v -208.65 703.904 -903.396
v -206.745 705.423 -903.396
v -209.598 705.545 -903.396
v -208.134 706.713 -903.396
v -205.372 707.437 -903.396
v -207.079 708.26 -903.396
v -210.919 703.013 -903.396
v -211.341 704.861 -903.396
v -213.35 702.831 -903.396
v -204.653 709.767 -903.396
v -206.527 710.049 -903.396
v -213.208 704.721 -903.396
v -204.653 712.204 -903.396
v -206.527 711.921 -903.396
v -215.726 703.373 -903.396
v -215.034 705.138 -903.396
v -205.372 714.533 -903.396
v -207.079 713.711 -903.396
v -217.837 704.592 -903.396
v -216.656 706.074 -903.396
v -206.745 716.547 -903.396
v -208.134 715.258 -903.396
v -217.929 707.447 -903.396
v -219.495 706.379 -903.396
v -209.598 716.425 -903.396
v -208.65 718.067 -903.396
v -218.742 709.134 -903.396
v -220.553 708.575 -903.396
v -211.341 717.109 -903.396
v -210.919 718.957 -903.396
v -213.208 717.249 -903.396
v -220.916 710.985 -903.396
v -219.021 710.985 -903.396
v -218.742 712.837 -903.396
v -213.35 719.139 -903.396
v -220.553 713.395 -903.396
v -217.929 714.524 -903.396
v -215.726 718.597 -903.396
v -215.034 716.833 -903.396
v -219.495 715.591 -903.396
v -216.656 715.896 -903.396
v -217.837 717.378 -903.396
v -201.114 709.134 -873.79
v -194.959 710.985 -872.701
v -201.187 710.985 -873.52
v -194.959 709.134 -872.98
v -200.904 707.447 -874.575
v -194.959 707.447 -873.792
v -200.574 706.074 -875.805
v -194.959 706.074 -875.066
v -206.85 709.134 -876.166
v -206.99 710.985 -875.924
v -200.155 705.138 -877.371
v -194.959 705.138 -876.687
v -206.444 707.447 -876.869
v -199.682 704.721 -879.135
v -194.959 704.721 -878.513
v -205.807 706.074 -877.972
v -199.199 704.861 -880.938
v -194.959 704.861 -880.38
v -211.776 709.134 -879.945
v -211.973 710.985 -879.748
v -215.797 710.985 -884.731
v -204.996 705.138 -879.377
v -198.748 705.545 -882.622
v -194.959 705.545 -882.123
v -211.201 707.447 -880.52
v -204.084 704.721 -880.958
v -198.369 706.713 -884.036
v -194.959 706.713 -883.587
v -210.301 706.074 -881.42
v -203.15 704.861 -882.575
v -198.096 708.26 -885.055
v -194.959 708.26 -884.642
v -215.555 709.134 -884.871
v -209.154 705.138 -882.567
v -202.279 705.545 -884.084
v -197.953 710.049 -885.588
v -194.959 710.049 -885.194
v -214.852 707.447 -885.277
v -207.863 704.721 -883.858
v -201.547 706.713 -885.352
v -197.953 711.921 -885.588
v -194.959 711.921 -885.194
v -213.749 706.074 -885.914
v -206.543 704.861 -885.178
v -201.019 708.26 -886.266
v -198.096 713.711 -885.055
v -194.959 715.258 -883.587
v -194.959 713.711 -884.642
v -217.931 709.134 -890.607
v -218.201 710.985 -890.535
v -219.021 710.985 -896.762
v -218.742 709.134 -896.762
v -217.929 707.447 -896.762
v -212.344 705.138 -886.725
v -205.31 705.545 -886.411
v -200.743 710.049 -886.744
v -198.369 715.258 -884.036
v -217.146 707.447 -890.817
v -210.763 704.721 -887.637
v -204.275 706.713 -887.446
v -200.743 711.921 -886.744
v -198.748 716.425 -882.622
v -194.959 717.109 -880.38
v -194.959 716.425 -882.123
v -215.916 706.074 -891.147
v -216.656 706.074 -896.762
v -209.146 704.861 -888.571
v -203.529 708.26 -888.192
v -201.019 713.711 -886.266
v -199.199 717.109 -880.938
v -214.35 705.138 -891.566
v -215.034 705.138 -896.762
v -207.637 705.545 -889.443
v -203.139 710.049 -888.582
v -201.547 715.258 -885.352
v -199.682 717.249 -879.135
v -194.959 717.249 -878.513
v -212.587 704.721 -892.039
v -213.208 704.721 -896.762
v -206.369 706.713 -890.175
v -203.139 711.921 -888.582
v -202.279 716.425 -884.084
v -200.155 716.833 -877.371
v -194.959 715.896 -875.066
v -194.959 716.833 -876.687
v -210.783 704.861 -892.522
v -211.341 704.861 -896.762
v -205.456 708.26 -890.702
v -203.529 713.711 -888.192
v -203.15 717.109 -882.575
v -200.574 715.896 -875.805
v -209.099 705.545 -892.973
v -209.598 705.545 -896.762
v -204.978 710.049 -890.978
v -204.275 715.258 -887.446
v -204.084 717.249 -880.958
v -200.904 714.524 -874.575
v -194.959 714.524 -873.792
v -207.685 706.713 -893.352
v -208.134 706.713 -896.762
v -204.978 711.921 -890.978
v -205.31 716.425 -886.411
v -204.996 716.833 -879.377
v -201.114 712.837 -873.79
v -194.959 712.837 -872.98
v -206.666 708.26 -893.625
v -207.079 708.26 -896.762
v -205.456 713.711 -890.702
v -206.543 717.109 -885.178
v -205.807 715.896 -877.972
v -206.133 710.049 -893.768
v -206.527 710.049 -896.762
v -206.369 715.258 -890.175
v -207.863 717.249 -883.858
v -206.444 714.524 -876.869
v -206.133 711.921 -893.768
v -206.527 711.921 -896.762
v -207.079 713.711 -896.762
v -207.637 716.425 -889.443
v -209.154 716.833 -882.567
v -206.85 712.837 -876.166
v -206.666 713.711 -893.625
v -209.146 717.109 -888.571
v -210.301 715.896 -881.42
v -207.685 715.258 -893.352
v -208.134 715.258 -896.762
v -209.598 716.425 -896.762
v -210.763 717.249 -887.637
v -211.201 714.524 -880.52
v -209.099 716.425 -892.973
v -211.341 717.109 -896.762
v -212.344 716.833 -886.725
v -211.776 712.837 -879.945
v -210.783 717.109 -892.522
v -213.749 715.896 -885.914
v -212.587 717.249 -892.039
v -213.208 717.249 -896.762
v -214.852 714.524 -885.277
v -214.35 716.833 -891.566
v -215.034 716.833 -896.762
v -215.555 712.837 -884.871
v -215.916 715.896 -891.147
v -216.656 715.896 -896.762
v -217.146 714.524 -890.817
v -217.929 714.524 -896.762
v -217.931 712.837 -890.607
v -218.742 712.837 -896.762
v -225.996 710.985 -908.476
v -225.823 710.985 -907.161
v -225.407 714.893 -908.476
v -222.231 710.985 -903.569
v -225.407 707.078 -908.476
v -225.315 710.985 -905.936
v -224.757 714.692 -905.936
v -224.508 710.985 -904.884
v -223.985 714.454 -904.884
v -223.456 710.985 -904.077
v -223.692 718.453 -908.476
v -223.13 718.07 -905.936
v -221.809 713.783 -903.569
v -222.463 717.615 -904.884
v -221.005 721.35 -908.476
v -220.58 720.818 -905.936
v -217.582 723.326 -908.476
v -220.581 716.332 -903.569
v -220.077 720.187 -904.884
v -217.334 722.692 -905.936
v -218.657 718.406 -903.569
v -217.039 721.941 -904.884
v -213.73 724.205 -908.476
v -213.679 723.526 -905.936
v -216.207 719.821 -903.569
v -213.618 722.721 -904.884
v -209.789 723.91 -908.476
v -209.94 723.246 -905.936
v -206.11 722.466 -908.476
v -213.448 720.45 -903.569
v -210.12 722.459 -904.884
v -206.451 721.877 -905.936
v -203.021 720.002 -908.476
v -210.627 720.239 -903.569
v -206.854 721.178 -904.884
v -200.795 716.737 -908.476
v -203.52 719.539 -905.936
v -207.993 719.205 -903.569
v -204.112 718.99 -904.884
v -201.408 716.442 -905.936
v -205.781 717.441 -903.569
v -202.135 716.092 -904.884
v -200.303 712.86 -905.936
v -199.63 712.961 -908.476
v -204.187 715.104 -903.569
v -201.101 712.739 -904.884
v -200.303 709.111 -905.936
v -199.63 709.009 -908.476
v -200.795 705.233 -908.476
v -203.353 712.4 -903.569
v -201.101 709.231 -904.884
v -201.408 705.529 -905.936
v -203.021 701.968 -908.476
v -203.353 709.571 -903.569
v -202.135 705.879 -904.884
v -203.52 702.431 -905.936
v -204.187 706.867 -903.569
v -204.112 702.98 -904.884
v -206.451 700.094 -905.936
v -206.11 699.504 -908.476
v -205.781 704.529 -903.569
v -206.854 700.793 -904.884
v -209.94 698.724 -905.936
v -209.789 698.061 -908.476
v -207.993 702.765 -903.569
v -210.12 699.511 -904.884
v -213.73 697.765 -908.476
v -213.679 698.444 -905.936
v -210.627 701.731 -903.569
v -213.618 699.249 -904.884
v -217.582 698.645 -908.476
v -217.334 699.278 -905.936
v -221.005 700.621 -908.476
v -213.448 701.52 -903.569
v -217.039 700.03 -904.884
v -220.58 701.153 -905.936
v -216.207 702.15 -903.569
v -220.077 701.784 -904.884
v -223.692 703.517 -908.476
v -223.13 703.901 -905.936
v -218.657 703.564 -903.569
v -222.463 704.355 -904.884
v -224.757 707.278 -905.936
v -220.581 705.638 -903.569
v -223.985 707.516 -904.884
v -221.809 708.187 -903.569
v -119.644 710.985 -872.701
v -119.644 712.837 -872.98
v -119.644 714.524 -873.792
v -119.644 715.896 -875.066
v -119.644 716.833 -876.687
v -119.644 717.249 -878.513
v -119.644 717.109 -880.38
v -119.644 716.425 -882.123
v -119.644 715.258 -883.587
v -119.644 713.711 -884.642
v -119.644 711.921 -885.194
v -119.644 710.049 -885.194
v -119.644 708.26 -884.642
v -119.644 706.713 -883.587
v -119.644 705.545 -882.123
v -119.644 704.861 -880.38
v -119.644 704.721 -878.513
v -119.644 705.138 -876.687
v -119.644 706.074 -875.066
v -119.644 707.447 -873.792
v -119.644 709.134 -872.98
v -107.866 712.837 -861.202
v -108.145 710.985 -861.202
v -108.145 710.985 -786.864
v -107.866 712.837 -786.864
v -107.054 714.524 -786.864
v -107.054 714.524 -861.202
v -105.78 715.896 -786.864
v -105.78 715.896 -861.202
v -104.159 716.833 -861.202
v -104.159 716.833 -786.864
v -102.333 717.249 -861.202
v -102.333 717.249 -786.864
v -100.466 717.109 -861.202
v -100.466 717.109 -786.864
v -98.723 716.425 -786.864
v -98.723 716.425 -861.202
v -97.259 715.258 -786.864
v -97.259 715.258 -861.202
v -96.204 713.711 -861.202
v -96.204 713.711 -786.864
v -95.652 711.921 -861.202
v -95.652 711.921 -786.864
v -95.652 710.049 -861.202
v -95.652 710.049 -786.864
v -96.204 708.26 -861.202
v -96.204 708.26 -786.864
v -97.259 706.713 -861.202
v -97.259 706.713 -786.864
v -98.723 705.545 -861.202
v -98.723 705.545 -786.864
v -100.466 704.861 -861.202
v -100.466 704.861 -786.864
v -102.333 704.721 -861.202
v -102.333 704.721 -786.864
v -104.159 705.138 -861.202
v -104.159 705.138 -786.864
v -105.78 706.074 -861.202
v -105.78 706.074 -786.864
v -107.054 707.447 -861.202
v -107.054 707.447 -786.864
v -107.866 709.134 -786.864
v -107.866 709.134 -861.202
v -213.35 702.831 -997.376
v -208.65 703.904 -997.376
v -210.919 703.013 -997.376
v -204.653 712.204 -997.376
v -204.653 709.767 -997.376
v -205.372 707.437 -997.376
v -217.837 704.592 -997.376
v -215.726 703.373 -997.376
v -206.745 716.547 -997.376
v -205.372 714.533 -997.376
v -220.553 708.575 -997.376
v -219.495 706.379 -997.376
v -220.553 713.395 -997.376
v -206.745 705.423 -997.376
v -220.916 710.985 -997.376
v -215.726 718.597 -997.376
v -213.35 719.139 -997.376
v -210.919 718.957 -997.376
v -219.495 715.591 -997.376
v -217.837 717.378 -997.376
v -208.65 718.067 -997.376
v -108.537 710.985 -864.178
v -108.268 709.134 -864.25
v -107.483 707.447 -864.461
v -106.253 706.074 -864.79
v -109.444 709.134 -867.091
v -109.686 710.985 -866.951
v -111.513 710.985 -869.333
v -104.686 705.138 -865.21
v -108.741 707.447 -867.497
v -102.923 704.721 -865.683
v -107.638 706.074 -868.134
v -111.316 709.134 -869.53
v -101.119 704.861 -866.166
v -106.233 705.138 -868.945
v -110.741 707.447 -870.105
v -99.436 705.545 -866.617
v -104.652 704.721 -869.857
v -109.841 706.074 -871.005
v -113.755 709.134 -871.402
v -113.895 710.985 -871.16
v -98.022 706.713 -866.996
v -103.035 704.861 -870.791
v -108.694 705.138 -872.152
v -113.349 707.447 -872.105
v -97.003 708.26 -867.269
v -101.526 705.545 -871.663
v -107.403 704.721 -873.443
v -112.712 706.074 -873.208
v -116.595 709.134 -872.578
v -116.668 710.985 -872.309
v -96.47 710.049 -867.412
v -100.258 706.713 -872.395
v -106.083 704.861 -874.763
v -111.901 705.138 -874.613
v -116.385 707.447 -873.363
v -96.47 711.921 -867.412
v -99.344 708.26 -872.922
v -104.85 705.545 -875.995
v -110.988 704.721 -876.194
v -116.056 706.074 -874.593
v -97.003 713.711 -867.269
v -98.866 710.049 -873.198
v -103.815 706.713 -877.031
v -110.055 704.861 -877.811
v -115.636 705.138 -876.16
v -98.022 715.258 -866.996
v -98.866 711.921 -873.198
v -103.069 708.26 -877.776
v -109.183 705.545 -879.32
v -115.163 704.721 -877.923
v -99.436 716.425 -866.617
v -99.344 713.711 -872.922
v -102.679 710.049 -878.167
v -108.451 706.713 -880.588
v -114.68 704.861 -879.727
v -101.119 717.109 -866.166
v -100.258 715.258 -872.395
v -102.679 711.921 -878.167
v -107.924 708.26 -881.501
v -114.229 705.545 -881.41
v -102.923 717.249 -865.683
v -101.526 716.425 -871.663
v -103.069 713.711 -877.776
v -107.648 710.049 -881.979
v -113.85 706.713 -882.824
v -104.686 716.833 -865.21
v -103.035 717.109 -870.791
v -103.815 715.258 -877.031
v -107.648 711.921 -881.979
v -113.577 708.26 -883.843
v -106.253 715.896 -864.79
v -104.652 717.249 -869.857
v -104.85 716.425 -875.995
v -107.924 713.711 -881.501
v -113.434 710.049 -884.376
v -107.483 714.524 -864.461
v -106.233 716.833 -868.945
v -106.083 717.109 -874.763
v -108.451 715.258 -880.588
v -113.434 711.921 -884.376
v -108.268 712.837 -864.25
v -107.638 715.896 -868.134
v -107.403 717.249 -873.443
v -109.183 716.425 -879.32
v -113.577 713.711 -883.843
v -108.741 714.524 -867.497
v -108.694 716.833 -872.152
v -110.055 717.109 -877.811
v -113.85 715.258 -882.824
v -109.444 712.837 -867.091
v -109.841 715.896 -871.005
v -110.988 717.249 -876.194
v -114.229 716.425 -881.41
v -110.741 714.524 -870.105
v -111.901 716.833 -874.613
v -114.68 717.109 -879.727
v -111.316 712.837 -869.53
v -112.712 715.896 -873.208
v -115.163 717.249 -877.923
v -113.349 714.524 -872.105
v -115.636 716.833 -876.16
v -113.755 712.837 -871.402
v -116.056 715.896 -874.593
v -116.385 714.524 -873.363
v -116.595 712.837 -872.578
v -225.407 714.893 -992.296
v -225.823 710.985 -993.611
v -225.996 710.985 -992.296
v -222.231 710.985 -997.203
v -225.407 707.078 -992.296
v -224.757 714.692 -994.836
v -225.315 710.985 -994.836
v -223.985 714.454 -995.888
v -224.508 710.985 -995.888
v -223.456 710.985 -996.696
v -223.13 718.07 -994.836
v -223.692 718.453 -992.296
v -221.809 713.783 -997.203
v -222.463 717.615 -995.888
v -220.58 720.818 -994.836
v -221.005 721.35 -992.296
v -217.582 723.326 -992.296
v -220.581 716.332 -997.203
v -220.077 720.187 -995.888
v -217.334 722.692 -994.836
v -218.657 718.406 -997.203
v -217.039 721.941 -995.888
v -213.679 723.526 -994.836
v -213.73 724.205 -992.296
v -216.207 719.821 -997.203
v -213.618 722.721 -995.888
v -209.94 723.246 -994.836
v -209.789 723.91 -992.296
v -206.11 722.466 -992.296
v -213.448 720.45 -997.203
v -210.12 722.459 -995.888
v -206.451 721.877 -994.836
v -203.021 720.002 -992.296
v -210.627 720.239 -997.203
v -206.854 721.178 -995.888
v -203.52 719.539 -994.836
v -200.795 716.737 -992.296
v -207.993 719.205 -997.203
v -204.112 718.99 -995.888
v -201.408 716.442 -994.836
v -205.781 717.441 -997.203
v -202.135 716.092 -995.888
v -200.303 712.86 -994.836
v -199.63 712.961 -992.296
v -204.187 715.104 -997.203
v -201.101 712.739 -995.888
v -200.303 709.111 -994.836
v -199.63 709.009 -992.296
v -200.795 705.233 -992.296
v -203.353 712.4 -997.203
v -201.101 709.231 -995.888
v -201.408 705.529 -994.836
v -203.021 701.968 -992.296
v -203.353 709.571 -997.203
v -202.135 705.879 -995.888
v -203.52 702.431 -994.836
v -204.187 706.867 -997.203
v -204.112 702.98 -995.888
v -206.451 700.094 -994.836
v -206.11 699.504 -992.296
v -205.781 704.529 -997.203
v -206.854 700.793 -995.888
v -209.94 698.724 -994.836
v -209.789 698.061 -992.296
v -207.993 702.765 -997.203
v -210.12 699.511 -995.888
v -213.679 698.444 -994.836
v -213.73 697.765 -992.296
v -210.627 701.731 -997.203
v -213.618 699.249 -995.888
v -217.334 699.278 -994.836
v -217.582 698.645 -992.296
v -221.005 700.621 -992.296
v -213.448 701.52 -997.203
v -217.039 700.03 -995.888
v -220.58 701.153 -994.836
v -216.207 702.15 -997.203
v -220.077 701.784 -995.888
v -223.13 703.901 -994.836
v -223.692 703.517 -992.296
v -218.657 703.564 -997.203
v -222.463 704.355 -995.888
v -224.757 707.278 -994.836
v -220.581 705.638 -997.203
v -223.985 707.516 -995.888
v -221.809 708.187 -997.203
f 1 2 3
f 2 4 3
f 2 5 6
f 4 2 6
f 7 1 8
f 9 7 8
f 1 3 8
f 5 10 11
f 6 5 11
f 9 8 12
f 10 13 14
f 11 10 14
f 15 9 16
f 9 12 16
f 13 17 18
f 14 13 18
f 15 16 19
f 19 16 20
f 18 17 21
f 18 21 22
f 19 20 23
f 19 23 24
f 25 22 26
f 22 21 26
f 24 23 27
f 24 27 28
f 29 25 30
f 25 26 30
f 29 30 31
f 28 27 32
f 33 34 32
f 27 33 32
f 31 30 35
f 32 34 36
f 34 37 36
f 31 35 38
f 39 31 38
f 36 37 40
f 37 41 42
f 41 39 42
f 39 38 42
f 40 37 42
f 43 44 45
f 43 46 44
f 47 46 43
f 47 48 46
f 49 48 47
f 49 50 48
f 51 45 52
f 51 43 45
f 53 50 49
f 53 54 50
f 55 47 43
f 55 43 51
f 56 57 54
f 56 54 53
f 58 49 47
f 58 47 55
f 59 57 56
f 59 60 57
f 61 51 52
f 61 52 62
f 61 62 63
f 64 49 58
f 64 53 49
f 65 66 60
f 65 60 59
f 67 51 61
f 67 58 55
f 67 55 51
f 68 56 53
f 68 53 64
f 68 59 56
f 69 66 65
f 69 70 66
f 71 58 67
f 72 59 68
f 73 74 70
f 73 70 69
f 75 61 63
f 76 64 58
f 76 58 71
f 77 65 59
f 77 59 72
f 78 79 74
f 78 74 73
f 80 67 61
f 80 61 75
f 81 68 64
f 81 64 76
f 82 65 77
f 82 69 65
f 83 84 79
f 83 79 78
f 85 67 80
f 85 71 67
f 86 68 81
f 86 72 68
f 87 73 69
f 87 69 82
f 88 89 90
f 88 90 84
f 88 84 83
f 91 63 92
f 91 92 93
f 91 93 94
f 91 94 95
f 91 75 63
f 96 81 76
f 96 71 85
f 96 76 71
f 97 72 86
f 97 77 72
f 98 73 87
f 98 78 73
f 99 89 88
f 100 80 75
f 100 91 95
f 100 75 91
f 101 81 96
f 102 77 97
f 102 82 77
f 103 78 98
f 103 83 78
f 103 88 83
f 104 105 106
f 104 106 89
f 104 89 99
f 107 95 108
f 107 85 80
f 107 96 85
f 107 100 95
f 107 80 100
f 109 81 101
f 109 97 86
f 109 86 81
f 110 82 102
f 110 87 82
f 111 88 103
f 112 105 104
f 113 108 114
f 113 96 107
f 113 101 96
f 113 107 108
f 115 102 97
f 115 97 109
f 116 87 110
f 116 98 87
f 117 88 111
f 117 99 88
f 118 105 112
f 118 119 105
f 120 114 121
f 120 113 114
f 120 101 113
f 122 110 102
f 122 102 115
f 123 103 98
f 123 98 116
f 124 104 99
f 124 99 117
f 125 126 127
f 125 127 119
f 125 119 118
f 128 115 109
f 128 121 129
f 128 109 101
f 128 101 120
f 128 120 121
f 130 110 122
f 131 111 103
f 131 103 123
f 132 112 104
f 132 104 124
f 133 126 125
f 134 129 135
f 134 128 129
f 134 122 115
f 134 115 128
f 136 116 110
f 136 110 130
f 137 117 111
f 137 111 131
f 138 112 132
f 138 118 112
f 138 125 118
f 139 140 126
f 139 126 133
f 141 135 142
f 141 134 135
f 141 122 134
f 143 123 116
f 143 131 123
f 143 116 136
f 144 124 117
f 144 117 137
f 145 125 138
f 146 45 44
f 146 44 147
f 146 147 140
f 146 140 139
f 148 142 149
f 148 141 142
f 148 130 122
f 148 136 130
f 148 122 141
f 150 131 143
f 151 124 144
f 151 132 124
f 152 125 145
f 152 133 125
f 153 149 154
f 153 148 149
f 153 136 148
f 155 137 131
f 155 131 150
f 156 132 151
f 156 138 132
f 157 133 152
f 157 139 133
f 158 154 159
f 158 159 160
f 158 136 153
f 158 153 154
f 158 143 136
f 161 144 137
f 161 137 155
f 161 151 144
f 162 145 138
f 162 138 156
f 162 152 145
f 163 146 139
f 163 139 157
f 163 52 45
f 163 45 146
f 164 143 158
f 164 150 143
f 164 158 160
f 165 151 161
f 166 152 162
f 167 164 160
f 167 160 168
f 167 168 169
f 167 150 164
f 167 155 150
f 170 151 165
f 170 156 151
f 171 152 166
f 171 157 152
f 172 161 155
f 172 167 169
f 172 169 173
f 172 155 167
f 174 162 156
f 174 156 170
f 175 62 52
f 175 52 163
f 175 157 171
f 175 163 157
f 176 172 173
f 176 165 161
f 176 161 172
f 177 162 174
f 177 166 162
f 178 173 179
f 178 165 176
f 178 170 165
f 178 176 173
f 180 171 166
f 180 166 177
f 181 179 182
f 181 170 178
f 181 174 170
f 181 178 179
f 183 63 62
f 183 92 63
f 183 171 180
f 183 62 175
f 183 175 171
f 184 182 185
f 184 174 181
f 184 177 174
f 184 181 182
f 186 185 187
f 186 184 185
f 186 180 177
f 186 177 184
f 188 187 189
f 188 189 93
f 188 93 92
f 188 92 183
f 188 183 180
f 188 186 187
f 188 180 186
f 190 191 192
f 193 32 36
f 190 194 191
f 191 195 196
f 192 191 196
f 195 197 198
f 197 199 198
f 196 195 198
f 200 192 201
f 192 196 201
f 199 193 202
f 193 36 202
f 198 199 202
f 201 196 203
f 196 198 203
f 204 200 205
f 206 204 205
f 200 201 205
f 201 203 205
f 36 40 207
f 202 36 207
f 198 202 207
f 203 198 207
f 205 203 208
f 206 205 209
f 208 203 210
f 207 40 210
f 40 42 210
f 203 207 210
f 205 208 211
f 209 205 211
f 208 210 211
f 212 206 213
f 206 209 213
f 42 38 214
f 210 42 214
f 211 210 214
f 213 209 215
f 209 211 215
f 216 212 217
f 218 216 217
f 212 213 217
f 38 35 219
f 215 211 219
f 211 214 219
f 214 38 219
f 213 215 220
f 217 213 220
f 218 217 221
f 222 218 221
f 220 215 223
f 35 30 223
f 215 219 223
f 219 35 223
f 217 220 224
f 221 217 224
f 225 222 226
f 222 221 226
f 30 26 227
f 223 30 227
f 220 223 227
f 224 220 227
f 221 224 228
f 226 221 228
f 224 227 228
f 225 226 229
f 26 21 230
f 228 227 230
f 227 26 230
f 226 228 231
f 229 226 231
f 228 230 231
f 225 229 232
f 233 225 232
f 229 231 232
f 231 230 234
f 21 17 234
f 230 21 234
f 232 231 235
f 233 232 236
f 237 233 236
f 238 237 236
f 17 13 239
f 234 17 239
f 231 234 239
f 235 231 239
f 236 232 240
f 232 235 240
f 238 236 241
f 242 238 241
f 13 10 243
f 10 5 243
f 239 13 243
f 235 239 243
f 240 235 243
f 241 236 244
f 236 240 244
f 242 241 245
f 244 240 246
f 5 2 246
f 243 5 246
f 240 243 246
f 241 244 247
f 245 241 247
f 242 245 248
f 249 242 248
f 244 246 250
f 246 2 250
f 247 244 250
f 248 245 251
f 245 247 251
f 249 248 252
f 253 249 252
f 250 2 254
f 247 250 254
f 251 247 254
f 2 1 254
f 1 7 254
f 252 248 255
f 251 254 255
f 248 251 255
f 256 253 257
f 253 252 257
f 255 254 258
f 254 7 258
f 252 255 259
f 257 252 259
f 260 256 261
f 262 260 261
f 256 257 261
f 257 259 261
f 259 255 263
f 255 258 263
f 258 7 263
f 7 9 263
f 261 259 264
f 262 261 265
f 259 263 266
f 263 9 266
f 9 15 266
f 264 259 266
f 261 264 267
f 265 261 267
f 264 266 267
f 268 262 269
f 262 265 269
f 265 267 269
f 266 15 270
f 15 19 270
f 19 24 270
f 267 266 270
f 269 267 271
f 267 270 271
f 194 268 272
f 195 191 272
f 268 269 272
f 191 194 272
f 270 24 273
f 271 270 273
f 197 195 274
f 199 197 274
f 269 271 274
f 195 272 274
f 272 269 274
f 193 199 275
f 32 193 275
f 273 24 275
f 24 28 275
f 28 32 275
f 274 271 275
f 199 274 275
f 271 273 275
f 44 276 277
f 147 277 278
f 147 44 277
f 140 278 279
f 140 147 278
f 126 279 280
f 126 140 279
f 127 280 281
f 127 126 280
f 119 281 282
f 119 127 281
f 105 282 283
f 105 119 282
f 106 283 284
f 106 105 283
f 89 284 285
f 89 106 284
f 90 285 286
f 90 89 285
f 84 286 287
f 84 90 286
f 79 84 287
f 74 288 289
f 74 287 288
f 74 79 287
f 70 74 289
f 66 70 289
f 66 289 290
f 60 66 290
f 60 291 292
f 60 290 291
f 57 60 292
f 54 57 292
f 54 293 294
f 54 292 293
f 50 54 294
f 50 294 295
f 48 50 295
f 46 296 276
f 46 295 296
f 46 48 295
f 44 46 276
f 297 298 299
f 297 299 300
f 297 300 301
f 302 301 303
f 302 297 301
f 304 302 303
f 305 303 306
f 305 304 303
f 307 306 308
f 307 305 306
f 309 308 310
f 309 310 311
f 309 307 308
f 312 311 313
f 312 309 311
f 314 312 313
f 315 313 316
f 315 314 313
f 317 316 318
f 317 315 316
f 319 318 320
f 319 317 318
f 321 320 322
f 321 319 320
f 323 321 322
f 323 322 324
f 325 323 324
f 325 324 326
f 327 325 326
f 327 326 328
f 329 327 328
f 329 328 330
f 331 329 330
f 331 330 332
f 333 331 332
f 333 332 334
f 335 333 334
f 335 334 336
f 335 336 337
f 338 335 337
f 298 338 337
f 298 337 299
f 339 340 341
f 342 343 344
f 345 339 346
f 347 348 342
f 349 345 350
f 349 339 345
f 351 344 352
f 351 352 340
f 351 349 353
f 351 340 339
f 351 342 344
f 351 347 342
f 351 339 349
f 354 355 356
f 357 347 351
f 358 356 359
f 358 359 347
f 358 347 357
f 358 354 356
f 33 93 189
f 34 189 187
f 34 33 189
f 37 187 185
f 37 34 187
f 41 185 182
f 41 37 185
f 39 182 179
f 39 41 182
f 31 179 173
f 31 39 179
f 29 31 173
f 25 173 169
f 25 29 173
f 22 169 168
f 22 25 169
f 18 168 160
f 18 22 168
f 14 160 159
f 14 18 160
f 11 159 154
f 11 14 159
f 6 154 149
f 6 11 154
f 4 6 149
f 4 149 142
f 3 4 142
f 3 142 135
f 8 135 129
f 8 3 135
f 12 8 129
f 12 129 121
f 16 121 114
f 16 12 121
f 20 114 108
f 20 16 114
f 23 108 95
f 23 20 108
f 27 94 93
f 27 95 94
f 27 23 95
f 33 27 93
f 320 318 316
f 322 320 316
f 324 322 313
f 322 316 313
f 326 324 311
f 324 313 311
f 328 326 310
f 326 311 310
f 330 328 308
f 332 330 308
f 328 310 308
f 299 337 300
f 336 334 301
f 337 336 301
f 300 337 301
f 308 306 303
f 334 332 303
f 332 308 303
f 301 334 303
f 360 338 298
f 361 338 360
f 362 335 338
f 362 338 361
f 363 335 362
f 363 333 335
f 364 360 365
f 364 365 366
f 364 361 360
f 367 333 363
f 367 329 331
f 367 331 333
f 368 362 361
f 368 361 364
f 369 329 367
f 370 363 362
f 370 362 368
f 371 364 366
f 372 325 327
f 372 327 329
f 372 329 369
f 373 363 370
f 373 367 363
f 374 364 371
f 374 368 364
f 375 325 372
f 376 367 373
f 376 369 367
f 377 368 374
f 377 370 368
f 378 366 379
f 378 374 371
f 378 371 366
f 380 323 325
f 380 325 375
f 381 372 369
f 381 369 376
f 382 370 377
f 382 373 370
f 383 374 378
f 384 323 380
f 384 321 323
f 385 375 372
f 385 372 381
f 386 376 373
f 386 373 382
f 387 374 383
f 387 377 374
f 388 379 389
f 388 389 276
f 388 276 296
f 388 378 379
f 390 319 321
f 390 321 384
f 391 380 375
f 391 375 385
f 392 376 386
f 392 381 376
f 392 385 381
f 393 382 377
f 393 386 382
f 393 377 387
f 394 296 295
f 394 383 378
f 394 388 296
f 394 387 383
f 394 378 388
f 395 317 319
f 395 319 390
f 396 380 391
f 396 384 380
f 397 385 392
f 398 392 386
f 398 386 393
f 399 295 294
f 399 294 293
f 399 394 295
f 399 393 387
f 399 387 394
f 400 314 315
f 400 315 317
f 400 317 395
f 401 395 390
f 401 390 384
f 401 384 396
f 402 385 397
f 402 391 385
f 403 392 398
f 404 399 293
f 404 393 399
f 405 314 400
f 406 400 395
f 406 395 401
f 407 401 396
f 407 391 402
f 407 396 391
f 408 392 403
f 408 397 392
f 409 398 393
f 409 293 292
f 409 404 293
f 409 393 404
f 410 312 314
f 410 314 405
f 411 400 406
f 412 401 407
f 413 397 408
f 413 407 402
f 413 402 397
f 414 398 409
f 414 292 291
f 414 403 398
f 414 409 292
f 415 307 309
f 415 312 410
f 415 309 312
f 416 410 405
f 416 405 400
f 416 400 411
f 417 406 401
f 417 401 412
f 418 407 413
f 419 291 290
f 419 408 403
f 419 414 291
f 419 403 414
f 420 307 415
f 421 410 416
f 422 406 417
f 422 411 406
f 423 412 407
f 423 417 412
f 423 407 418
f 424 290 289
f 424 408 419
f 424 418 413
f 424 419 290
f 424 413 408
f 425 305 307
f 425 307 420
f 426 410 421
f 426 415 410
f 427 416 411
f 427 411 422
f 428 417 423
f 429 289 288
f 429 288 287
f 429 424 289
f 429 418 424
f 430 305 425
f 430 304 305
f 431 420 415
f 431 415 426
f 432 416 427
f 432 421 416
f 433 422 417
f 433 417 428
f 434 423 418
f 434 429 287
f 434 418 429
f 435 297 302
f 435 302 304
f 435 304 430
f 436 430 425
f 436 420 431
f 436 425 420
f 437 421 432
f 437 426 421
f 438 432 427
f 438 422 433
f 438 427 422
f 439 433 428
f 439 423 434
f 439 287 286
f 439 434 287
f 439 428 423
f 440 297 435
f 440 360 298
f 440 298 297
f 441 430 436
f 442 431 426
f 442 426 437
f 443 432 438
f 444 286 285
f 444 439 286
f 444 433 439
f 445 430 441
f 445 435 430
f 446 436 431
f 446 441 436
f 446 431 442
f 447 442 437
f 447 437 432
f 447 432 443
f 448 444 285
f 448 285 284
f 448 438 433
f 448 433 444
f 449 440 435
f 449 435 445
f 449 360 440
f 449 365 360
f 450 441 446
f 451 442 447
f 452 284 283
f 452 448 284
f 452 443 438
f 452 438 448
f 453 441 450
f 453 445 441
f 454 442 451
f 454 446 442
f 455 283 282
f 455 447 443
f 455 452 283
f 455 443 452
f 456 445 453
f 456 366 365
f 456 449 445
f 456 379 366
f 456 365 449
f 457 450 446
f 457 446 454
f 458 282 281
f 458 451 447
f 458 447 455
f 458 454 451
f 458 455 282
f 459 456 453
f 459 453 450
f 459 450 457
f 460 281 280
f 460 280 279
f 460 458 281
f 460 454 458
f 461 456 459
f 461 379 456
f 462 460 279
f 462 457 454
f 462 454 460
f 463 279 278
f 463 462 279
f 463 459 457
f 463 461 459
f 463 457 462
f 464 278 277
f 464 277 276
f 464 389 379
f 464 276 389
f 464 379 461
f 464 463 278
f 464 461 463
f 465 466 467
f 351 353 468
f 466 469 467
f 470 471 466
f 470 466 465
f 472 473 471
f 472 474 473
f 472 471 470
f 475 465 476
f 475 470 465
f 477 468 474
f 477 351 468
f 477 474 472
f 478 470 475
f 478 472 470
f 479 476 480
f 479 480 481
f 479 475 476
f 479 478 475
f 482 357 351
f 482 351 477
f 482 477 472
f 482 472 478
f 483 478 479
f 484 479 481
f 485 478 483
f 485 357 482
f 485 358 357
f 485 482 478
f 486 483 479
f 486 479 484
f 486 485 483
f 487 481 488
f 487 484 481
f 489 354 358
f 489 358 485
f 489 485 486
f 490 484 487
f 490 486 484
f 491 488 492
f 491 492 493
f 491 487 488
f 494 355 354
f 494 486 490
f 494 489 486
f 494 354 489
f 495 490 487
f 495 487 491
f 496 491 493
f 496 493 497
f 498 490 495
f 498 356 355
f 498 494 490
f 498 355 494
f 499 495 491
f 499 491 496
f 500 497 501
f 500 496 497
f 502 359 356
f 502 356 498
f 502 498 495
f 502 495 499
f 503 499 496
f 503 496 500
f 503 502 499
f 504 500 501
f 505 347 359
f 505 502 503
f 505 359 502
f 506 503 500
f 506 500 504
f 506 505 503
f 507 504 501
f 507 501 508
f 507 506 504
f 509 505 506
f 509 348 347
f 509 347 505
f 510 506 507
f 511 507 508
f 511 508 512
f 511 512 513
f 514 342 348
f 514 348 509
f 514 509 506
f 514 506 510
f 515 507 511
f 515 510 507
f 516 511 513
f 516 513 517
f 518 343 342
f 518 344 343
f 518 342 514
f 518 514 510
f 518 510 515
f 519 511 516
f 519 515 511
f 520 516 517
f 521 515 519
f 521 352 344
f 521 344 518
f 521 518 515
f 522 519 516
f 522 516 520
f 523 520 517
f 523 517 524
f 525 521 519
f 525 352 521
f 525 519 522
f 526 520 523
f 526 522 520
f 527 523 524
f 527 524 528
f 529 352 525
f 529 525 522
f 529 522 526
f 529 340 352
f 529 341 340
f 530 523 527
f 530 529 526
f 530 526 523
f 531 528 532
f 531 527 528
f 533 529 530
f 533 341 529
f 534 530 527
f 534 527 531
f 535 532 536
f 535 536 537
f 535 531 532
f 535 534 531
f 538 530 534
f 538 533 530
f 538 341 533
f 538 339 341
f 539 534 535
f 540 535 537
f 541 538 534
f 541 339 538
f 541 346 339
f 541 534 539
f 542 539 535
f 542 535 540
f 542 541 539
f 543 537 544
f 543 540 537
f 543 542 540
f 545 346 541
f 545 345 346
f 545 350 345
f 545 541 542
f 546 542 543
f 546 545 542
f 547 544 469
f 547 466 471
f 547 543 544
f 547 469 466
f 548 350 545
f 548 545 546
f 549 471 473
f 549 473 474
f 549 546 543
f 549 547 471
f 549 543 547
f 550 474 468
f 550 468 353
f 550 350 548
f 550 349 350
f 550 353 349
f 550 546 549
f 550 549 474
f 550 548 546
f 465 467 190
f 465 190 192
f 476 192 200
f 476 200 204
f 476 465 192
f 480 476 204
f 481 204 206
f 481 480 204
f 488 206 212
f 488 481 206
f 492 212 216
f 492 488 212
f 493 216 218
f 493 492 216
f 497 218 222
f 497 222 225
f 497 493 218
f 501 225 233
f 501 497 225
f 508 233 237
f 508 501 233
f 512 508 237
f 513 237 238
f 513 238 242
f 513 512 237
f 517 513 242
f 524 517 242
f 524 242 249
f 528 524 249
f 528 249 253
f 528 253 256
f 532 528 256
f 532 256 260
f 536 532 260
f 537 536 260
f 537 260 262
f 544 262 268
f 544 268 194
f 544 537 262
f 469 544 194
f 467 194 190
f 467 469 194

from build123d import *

# Parameters (mm, degrees)
SKETCH2_R           = 6.281650674
SKETCH3_R           = 13.256970647
BOSS_EXTRUDE2_DEPTH = 93.98
FILLET1_R           = 5.08


with BuildPart() as part:
    # Sweep1: sweep along a curve in space
    with BuildLine() as sweep1_path:
        Line((-101.863707381, 710.985218526, -786.864459981), (-101.863707381, 710.985218526, -861.202210018))
        ThreePointArc((-101.863707381, 710.985218526, -861.202210018), (-107.071348812, 710.985218526, -873.774568588), (-119.643707381, 710.985218526, -878.982210018))
        Line((-119.643707381, 710.985218526, -878.982210018), (-194.958974291, 710.985218526, -878.982210018))
        ThreePointArc((-194.958974291, 710.985218526, -878.982210018), (-207.531332861, 710.985218526, -884.189851449), (-212.738974291, 710.985218526, -896.762210018))
        Line((-212.738974291, 710.985218526, -896.762210018), (-212.738974291, 710.985218526, -997.376214376))
    # Sketch2 → Sweep1 (sweep)
    with BuildSketch(Plane(origin=(-212.738974291, 710.985218526, -997.376214376), x_dir=(-1, 0, 0), z_dir=(0, 0, -1))):
        Circle(SKETCH2_R)
    sweep(path=sweep1_path.line)

    # Sketch3 → Boss-Extrude2 (add)
    with BuildSketch(Plane(origin=(0, 0, -997.376214376), x_dir=(-1, 0, 0), z_dir=(0, 0, -1))):
        with Locations((212.738974291, 710.985218526)):
            Circle(SKETCH3_R)
    extrude(amount=-BOSS_EXTRUDE2_DEPTH)

    # Fillet1
    fillet1_edges = [part.edges().sort_by_distance(p)[0] for p in [
        (-199.482003644, 710.985218526, -903.396214376),
        (-199.482003644, 710.985218526, -997.376214376),
    ]]
    fillet(fillet1_edges, radius=FILLET1_R)


solid = part.part
